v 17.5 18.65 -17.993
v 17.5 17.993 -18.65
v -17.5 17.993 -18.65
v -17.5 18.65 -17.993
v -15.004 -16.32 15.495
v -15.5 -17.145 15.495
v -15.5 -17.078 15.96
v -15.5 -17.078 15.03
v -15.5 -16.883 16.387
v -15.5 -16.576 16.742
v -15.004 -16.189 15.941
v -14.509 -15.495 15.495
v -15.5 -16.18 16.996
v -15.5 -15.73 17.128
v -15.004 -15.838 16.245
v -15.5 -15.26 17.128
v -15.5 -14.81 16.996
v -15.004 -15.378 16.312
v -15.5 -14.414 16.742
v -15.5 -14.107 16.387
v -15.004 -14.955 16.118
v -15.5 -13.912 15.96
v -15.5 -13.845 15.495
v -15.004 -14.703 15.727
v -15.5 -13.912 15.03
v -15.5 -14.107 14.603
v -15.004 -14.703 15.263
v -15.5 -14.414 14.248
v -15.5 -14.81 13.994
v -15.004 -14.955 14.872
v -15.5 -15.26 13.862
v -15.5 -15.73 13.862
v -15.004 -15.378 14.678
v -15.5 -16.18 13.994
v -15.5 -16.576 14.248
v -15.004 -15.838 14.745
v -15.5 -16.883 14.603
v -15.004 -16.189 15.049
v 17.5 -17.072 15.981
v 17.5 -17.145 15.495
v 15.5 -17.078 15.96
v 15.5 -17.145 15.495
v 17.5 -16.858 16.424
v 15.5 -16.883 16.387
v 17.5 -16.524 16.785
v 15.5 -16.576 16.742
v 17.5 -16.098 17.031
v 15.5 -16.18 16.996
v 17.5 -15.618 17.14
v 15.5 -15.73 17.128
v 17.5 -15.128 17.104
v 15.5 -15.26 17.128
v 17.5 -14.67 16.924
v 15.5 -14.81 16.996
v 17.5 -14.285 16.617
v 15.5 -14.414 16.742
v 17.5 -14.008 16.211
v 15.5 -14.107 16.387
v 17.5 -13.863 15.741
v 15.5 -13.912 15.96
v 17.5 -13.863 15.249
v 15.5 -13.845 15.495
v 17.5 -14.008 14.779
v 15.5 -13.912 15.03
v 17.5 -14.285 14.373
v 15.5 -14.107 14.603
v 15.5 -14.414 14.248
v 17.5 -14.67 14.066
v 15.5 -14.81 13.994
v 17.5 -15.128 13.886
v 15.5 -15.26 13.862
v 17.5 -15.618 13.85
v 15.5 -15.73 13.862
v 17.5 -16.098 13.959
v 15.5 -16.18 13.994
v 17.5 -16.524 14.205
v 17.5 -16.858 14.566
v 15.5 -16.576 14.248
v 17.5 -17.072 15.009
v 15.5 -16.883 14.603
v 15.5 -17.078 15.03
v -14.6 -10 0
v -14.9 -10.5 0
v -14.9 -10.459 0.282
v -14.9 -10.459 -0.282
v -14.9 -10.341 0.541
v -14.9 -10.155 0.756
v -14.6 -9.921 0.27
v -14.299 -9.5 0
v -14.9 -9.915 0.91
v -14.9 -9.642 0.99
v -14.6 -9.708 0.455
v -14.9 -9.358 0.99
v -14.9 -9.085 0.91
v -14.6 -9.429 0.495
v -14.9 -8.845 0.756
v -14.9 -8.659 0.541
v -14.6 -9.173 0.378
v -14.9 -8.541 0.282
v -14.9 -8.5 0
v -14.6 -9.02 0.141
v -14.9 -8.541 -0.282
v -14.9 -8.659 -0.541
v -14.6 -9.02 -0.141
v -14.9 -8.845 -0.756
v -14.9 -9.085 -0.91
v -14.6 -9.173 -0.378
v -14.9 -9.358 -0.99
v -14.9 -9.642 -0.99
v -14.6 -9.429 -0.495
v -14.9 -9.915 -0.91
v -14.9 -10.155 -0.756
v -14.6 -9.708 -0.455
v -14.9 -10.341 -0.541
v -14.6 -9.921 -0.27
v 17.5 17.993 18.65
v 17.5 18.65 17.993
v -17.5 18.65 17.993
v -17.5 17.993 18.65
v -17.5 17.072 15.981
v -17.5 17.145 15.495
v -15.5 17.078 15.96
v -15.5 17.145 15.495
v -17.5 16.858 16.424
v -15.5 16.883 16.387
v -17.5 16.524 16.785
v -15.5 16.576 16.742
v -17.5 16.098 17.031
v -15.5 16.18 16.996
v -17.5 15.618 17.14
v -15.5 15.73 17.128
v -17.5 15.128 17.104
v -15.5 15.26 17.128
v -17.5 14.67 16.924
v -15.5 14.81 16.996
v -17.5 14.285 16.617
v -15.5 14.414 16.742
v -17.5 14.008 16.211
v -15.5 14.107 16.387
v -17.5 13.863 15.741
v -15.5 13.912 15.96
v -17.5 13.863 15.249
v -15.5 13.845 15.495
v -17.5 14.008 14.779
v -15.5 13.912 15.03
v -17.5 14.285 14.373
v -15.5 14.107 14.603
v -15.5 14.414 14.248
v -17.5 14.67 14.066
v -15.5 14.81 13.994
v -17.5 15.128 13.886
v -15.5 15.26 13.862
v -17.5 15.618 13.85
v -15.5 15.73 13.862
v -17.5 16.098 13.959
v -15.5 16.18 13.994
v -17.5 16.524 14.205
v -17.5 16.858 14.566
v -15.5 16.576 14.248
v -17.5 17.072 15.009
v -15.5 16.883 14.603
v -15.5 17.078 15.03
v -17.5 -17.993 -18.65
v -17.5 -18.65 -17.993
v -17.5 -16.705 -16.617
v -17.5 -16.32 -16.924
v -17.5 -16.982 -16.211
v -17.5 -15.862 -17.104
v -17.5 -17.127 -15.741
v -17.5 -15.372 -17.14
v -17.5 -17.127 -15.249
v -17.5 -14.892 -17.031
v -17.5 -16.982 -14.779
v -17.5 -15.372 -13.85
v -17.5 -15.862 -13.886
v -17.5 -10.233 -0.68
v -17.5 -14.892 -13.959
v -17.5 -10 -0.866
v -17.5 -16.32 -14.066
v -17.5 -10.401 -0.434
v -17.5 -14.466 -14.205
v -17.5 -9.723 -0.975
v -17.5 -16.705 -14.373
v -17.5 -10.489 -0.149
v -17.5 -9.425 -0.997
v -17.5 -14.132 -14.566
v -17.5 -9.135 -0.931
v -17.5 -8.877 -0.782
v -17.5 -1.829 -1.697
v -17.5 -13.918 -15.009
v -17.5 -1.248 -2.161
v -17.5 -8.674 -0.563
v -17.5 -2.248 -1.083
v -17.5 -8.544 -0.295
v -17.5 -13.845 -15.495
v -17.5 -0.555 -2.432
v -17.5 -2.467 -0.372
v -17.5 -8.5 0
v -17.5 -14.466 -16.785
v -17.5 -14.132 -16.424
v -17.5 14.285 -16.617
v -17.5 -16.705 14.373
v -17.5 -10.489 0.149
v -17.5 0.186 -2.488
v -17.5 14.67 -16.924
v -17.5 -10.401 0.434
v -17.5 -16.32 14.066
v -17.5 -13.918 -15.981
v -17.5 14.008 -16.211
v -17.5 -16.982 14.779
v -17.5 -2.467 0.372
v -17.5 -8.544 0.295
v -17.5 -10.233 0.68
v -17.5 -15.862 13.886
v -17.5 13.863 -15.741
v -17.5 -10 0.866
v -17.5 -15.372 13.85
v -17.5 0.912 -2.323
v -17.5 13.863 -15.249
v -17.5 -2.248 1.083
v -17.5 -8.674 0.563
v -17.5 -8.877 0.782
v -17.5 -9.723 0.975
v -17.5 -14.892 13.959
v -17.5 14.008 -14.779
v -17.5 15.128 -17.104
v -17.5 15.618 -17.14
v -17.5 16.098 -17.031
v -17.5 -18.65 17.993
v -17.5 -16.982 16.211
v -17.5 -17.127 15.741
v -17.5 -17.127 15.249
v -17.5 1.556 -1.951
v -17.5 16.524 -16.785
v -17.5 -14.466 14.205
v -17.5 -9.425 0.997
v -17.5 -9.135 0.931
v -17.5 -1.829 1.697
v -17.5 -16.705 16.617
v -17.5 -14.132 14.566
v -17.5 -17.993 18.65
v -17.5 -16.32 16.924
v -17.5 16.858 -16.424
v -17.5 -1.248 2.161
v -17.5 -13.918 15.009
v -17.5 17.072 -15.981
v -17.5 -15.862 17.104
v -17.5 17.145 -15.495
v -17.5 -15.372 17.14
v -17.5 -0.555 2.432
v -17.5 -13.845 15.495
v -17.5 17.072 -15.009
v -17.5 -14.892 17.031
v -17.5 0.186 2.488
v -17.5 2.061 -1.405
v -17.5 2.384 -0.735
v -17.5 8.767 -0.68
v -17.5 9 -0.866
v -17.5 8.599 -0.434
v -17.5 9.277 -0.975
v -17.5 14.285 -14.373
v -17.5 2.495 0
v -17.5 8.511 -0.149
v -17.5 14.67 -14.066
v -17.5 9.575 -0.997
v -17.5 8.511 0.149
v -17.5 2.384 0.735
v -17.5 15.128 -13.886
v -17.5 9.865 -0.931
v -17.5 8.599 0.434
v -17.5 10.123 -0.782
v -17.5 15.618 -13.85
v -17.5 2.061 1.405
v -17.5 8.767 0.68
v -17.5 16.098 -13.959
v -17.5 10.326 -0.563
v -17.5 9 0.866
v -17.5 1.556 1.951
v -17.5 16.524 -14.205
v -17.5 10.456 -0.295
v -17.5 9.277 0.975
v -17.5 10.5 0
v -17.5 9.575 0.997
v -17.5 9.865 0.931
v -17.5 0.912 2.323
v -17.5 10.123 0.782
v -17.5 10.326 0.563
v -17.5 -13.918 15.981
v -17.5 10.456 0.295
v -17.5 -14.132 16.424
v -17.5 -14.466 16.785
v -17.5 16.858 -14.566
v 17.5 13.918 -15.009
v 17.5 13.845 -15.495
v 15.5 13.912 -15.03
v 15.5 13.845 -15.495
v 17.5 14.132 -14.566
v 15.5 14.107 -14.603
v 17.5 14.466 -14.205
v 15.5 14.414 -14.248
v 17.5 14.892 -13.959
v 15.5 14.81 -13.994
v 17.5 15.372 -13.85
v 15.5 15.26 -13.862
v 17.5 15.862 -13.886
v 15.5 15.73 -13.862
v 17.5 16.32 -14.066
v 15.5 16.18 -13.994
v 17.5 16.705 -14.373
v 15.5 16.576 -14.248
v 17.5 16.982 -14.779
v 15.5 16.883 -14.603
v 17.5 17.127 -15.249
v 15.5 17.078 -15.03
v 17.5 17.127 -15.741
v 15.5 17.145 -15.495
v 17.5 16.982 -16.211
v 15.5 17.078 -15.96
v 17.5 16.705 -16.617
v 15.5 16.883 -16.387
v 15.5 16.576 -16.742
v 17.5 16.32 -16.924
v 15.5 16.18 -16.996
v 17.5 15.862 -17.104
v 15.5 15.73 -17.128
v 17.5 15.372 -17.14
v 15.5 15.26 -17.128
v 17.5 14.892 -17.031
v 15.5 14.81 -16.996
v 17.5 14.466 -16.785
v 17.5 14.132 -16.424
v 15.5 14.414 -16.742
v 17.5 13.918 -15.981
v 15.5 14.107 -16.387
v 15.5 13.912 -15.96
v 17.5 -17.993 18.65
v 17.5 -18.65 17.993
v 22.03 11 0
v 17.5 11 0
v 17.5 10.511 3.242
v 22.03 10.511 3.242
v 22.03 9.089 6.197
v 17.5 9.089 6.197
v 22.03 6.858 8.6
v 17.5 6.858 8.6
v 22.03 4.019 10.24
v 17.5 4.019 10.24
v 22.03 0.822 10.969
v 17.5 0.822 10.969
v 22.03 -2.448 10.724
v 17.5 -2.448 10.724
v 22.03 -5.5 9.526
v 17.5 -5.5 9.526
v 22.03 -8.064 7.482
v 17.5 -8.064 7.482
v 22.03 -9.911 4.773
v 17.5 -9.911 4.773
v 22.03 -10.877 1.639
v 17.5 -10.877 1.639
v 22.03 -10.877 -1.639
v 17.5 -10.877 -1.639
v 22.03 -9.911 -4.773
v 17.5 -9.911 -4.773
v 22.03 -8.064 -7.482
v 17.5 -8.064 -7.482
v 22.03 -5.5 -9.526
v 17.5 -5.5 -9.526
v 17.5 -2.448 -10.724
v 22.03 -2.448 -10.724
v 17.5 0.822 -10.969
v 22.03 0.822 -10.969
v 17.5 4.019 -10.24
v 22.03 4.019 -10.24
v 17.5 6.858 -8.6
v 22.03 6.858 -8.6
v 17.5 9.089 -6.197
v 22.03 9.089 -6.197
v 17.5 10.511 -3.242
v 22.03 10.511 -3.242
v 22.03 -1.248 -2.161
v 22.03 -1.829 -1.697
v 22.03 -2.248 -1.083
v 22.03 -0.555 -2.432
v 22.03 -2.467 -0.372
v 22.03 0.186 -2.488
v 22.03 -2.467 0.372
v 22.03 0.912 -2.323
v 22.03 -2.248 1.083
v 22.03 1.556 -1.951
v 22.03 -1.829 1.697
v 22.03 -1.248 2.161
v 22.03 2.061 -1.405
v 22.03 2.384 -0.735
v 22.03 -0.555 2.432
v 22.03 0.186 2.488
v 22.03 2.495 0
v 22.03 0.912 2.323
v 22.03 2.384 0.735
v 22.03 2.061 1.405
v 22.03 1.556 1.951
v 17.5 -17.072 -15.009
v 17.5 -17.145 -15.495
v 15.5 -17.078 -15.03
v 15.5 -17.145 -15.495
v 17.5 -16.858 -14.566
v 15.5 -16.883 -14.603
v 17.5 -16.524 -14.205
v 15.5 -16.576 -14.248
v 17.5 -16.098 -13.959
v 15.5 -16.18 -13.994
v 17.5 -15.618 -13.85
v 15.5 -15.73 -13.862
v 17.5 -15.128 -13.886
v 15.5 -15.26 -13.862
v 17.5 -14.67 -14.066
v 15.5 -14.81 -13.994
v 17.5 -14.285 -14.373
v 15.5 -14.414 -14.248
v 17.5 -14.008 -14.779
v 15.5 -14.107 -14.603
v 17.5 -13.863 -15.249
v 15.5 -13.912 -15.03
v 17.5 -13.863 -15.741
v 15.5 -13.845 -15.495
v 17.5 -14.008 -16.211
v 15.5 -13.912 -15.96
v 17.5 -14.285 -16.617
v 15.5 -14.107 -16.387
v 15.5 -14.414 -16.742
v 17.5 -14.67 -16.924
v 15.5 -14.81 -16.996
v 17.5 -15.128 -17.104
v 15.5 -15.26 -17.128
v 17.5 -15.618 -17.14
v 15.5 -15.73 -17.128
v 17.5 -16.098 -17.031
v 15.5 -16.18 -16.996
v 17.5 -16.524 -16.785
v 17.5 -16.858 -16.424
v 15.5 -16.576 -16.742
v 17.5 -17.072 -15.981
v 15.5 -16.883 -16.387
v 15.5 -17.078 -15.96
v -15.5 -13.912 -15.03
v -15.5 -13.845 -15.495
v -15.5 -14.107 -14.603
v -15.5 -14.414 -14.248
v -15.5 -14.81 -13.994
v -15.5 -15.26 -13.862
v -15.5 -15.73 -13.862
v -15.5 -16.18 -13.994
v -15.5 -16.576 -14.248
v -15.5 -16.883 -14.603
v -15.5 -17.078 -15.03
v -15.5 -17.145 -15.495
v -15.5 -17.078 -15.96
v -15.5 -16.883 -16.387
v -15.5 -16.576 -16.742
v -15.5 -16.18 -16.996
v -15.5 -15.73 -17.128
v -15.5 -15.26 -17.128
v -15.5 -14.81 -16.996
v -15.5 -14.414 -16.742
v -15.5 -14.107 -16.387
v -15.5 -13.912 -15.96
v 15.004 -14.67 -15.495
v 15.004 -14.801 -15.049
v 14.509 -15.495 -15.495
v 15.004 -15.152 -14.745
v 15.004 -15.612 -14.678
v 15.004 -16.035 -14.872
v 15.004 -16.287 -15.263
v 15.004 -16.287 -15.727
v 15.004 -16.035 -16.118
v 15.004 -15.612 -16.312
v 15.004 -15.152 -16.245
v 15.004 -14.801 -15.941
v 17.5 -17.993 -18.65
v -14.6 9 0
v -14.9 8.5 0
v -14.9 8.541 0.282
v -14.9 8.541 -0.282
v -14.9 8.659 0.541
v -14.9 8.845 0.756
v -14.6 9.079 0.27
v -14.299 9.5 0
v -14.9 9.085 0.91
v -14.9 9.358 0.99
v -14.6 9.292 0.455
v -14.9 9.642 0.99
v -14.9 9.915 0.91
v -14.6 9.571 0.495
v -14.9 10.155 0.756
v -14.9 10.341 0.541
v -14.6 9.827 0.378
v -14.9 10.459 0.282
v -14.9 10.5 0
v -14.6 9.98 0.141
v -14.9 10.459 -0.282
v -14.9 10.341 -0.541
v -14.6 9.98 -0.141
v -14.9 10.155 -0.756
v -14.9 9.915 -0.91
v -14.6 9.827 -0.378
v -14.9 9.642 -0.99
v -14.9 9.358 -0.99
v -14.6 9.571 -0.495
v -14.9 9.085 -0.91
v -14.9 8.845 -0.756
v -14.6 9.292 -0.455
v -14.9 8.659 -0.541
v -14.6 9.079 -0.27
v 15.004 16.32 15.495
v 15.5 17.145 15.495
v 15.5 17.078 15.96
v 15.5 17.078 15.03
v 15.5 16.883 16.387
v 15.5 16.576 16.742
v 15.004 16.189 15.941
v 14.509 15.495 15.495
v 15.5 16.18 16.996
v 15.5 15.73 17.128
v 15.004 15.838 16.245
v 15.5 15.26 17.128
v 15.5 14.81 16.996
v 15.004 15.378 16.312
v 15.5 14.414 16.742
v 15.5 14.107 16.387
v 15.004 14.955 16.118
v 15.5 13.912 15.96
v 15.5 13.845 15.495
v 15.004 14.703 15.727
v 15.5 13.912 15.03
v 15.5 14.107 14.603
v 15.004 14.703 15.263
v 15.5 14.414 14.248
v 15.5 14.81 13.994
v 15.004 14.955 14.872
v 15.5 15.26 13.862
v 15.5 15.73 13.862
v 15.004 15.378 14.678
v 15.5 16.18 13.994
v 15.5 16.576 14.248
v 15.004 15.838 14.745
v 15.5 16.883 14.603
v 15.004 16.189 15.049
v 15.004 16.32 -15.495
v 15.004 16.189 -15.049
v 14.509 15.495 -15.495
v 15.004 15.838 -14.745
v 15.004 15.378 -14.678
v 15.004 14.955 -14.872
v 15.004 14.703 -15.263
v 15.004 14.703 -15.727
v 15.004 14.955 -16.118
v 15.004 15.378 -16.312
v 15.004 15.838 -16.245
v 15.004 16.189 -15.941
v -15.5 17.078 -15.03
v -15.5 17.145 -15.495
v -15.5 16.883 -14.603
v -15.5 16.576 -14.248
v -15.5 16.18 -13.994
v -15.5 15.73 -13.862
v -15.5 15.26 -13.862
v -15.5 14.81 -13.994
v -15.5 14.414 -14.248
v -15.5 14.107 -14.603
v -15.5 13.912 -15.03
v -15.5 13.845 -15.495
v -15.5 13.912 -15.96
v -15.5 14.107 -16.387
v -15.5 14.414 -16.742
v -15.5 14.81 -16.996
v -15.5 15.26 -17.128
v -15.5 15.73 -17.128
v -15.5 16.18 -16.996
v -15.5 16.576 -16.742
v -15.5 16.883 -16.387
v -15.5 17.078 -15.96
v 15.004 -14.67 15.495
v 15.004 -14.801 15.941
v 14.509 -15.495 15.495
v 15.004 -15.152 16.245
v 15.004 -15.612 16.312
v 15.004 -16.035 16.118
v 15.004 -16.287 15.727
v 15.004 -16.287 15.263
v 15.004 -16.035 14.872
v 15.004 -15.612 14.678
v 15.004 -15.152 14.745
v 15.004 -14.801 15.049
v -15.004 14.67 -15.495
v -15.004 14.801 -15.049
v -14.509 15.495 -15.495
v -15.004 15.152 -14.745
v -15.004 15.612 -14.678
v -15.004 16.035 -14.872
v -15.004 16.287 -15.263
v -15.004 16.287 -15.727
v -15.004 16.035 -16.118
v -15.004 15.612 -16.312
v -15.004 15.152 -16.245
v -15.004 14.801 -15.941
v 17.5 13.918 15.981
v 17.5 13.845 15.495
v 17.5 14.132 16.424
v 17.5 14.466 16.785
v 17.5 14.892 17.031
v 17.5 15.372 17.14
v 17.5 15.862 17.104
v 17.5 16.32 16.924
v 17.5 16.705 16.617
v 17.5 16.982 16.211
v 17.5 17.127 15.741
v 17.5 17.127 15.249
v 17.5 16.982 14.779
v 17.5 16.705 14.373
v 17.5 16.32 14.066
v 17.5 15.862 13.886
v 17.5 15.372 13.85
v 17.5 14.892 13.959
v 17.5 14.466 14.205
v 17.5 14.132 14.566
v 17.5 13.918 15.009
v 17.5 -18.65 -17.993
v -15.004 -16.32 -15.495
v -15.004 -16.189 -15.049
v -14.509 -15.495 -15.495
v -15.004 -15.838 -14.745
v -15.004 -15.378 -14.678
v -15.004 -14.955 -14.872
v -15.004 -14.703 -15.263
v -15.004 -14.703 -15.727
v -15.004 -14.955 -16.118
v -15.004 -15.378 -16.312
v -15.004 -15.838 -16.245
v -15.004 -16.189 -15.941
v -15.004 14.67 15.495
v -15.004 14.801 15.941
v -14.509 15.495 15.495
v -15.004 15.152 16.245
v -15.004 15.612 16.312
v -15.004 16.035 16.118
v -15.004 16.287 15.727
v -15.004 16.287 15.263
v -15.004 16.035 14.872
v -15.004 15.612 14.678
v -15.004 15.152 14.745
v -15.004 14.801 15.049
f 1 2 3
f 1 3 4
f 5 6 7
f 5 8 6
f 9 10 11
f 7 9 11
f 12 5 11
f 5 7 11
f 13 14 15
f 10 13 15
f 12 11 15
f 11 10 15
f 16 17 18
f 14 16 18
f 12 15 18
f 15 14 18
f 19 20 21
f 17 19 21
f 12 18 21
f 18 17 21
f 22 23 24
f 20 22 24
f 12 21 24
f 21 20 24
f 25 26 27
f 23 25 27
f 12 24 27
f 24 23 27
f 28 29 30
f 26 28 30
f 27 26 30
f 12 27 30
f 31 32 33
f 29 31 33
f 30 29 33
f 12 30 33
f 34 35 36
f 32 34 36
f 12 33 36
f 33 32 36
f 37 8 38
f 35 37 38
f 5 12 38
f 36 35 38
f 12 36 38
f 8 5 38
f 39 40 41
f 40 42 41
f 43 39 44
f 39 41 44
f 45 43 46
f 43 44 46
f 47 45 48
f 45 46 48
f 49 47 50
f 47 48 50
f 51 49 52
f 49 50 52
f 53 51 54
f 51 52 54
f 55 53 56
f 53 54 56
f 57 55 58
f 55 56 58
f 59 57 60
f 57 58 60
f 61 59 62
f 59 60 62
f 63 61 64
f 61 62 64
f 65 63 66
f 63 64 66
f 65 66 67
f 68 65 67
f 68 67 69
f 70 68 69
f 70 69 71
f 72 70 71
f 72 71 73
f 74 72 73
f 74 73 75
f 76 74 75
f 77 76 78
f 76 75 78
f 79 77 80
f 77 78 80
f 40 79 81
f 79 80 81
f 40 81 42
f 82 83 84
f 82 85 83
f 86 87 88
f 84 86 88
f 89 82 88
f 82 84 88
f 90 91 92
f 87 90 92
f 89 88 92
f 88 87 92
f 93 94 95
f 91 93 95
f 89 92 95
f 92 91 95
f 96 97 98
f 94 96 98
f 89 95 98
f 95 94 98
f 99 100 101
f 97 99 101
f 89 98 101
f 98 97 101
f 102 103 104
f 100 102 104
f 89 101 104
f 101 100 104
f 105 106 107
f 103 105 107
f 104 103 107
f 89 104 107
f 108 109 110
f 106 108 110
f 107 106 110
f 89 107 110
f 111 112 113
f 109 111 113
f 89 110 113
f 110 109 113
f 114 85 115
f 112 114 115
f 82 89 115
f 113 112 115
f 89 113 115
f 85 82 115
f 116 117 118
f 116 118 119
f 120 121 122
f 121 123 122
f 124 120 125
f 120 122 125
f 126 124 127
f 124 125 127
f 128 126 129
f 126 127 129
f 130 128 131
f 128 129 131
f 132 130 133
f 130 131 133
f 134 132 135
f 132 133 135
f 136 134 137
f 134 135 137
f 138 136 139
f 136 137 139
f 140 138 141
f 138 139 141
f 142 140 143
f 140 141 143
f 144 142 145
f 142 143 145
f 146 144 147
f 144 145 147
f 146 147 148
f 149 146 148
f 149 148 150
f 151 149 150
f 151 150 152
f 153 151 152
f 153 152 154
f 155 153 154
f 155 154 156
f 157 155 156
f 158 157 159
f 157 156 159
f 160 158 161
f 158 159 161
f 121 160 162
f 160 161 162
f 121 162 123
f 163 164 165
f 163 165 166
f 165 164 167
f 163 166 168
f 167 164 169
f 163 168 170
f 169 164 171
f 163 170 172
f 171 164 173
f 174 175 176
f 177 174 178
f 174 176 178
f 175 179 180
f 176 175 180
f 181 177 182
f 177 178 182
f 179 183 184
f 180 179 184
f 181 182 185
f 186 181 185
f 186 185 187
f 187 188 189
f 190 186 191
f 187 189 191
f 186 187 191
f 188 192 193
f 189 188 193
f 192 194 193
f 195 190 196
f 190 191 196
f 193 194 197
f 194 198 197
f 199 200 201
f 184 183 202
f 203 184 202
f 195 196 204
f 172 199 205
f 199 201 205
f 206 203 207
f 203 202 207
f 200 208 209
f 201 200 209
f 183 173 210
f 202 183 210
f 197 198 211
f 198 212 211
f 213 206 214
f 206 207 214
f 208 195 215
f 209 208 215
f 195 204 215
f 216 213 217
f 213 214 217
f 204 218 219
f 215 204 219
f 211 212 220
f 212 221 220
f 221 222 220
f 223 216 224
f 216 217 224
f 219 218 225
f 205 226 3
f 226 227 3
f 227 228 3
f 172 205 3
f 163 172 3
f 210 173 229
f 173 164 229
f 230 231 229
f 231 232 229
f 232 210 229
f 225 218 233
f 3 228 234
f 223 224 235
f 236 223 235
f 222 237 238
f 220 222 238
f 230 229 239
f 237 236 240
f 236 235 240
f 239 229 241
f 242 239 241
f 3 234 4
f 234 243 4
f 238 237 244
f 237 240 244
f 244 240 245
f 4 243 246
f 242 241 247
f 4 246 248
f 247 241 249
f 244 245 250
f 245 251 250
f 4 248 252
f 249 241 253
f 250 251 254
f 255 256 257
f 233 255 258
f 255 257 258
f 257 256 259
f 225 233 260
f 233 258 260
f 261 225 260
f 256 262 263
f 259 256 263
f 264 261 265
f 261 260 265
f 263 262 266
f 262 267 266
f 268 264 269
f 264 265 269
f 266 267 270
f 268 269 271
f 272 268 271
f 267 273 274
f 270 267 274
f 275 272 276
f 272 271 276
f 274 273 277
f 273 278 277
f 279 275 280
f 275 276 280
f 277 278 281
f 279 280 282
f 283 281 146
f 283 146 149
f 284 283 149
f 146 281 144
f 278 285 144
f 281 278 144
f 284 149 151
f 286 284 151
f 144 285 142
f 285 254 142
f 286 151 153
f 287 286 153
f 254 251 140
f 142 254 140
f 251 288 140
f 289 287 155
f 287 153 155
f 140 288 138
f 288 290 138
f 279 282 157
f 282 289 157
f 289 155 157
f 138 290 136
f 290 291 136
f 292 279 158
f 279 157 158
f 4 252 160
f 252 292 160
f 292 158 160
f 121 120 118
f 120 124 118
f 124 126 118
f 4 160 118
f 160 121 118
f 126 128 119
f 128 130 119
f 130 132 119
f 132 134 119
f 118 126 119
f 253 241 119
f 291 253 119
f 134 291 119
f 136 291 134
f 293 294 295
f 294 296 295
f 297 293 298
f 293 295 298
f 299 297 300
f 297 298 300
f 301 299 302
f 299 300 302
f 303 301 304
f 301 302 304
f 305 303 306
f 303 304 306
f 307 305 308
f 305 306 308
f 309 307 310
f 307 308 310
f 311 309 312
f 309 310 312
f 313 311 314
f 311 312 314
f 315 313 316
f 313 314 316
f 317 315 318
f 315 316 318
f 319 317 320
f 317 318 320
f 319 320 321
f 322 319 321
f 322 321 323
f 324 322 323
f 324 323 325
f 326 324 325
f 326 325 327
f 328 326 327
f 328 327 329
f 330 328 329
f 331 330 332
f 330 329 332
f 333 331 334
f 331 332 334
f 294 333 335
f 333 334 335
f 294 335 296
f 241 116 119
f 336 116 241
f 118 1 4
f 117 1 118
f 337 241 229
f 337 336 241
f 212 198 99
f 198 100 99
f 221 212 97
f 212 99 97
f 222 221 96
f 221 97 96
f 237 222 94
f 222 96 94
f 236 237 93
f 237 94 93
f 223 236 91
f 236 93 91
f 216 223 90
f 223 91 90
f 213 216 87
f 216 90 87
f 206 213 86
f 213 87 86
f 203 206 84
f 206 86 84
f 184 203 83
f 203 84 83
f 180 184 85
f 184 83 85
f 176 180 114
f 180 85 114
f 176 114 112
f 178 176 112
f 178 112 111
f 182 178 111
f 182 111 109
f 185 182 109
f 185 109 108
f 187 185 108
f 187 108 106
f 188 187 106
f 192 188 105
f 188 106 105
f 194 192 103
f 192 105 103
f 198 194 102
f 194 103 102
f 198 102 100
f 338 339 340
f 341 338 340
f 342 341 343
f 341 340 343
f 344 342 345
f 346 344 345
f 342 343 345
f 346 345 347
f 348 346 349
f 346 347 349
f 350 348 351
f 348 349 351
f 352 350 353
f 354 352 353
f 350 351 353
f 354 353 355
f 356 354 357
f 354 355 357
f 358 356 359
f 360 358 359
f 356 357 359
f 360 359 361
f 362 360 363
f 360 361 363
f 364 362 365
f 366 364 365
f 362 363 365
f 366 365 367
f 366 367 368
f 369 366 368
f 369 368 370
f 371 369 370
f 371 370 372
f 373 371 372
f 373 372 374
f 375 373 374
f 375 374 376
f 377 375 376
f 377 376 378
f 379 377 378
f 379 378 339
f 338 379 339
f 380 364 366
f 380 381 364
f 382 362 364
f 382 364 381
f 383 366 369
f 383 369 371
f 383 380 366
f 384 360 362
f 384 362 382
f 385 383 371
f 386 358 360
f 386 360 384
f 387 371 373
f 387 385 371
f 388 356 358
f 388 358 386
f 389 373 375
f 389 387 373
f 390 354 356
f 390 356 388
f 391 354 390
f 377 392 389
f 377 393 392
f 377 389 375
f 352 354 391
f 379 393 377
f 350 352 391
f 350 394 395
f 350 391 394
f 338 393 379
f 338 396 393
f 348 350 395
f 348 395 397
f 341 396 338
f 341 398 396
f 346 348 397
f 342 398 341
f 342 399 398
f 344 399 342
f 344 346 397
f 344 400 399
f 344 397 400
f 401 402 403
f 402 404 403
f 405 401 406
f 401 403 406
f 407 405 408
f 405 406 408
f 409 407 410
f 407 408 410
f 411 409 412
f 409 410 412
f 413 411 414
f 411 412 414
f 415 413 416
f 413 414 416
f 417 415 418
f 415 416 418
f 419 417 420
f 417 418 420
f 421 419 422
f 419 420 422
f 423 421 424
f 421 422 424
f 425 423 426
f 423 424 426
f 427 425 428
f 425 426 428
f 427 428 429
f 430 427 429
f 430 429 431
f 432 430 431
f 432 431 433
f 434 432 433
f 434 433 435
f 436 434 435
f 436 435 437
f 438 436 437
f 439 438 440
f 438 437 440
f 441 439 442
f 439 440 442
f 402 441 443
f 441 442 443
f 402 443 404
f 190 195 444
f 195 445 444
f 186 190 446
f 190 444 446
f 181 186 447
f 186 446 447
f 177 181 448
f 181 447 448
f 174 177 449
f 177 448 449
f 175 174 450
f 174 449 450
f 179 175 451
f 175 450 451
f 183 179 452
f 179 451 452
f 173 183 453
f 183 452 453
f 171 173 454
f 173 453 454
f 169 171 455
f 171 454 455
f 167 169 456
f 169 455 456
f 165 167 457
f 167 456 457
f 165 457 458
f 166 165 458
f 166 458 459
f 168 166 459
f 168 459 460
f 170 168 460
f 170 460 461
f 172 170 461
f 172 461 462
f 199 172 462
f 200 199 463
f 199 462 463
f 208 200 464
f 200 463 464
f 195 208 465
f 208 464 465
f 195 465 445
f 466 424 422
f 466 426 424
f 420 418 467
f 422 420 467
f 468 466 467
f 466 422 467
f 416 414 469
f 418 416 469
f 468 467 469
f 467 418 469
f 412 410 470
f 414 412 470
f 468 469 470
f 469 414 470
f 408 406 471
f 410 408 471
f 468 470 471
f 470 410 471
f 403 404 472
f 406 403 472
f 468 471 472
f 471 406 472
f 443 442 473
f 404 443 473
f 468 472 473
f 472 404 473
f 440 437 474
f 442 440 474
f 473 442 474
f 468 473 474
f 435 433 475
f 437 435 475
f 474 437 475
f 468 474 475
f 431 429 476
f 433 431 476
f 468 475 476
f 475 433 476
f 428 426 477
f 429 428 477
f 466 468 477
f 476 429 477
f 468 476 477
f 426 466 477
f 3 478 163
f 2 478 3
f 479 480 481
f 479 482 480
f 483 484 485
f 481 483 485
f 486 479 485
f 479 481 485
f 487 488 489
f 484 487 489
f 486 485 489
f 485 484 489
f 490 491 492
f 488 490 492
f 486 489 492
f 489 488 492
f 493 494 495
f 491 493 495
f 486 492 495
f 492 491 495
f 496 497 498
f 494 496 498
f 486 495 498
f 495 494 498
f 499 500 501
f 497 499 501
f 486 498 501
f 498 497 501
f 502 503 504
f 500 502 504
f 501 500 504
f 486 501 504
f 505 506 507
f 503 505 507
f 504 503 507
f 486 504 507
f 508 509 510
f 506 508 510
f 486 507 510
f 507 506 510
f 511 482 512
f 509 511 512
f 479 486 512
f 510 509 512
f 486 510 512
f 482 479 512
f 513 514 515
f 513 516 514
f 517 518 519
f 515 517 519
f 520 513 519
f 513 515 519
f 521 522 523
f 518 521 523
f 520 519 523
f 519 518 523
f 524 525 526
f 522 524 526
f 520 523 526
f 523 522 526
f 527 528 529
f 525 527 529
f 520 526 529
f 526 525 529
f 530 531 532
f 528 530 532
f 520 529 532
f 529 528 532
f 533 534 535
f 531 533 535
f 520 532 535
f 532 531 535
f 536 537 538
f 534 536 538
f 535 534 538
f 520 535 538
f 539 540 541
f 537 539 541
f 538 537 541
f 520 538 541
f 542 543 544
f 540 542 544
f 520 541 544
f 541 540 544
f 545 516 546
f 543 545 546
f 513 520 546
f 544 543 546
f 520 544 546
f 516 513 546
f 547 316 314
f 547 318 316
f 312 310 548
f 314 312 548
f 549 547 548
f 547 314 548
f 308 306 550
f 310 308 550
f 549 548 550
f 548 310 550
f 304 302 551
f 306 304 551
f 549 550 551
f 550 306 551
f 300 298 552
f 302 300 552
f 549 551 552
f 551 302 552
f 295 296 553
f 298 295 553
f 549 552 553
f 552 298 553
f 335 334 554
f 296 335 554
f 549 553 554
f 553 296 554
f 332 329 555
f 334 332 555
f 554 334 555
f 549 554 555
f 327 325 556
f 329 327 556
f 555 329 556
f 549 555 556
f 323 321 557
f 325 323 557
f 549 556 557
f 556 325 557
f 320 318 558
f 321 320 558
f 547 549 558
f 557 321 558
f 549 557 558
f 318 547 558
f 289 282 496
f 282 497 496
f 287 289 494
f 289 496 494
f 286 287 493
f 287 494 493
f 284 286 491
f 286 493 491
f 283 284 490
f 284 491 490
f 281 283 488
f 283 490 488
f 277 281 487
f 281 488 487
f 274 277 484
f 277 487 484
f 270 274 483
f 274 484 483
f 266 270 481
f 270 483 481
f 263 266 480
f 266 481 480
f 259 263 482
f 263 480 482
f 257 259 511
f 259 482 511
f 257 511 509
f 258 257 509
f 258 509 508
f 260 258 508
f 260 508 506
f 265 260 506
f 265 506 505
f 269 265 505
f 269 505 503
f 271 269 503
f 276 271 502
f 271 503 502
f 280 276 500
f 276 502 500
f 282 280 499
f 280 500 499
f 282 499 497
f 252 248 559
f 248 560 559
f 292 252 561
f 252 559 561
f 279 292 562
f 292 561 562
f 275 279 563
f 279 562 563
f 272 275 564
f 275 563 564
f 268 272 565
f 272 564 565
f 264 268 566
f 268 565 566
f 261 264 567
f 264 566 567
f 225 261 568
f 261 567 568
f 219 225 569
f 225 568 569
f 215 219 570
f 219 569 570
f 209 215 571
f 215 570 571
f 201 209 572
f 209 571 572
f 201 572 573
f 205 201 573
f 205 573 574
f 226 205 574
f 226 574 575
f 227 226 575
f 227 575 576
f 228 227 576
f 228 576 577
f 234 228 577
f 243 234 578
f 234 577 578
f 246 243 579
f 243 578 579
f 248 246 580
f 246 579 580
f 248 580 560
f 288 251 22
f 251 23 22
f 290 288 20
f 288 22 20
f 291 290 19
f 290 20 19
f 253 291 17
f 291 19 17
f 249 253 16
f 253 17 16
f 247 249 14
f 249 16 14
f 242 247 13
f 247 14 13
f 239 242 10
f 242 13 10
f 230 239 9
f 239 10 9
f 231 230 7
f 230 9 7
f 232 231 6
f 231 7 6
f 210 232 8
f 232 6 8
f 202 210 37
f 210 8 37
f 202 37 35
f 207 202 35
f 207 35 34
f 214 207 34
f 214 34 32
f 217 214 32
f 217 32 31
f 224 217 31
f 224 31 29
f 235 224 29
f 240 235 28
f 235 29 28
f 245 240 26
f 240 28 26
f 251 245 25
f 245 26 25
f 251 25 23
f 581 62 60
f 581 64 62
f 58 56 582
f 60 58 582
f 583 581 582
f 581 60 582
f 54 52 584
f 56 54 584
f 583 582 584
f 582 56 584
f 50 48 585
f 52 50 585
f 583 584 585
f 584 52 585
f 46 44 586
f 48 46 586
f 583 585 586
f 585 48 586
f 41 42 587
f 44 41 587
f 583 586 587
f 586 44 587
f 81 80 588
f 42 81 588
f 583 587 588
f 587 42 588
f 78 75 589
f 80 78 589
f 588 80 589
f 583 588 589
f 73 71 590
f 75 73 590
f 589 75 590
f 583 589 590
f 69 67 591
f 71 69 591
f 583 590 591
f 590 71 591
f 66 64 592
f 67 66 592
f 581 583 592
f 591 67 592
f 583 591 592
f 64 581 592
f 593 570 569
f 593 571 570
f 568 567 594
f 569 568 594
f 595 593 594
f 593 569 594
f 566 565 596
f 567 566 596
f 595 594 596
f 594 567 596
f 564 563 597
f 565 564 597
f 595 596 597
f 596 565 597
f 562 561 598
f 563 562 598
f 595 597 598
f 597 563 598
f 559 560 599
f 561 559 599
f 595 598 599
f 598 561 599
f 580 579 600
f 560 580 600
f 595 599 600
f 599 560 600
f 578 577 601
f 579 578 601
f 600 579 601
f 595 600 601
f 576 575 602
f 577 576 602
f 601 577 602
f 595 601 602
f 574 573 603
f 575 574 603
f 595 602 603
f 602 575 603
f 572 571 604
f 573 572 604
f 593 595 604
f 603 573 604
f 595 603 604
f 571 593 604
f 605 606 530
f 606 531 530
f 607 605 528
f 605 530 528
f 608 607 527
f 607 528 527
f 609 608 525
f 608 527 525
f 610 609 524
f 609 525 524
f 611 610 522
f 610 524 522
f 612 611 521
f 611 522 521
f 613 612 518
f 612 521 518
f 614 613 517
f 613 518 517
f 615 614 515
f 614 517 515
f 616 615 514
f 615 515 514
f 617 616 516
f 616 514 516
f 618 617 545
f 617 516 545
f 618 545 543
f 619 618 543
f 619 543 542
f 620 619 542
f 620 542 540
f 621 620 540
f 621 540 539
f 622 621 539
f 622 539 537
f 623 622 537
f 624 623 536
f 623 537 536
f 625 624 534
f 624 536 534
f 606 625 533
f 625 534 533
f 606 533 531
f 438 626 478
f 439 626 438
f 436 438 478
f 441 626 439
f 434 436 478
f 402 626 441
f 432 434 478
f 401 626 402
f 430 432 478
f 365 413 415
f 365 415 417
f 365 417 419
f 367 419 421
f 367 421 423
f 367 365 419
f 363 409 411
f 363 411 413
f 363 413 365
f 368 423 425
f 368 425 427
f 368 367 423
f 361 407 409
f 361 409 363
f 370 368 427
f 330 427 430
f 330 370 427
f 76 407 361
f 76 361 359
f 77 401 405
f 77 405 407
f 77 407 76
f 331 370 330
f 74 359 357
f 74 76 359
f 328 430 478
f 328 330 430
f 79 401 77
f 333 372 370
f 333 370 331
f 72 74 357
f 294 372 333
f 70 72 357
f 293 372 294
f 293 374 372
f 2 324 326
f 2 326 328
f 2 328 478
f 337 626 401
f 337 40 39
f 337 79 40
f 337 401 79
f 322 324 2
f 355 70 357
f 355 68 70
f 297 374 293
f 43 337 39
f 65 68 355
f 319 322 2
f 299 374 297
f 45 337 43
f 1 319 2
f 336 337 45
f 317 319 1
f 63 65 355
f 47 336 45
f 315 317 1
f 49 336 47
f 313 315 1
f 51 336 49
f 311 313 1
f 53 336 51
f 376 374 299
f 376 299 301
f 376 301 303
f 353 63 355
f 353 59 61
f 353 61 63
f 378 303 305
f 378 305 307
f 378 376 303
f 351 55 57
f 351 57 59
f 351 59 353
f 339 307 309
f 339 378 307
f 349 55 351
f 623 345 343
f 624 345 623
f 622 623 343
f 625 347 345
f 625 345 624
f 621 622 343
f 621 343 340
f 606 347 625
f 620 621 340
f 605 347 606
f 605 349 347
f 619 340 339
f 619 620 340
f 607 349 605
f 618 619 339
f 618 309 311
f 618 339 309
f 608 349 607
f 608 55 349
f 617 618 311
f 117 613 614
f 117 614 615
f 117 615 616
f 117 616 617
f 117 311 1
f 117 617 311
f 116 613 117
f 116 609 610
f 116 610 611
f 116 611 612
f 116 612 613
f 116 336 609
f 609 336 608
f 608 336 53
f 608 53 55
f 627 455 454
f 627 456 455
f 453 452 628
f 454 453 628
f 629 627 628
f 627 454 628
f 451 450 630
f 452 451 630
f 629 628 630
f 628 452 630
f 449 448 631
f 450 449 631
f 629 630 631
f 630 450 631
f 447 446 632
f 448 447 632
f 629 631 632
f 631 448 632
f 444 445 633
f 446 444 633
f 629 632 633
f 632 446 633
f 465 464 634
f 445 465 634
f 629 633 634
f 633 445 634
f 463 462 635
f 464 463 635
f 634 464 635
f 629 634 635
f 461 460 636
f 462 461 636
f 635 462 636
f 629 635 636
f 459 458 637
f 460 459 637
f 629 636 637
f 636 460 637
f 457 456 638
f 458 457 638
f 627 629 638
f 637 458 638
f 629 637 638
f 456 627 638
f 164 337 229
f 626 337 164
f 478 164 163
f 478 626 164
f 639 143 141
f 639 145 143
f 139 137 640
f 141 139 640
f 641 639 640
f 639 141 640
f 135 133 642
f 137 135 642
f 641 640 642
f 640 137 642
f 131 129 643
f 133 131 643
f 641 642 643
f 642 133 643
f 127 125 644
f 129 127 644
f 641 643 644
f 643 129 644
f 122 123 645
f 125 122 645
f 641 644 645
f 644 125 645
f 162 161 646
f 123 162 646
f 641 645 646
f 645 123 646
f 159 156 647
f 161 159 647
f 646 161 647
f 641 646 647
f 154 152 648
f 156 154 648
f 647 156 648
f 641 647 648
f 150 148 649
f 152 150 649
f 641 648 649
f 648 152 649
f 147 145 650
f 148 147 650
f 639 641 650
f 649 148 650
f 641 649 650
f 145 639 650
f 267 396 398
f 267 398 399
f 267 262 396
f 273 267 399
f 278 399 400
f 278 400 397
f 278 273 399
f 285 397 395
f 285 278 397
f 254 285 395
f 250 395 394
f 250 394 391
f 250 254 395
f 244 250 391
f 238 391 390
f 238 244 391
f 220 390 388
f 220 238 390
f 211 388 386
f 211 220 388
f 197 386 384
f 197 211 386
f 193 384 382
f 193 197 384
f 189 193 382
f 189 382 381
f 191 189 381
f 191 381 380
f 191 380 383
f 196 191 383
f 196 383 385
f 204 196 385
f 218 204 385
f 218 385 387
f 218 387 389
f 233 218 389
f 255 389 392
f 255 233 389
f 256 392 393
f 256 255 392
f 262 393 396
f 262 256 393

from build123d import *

# Parameters (mm, degrees)
F0_R     = 11
F1_DEPTH = 17.5
F0_R_2   = 2.495
F2_DEPTH = 17.5
F3_DEPTH = 22.03
F6_D     = 3.3
F6_DEPTH = 2
F6_TIP   = 0.9914200214
F7_D     = 3.3
F7_DEPTH = 2
F7_TIP   = 0.9914200214
F8_D     = 2
F8_DEPTH = 2.6
F8_TIP   = 0.600860619


with BuildPart() as f1:
    # F0 (on Right) → F1 (new body, symmetric)
    with BuildSketch(Plane.YZ):
        Polygon((-17.9930978003, -18.65), (17.9930978003, -18.65), (18.65, -17.9930978003), (18.65, 17.9930978003), (17.9930978003, 18.65), (-17.9930978003, 18.65), (-18.65, 17.9930978003), (-18.65, -17.9930978003), align=None)
        Circle(F0_R, mode=Mode.SUBTRACT)
    extrude(amount=F1_DEPTH, both=True)

    # F0 (on Right) → F2 (join, through all)
    with BuildSketch(Plane.YZ):
        Circle(F0_R)
        Circle(F0_R_2, mode=Mode.SUBTRACT)
    extrude(amount=-F2_DEPTH)

    # F0 (on Right) → F3 (join)
    with BuildSketch(Plane.YZ):
        Circle(F0_R)
        Circle(F0_R_2, mode=Mode.SUBTRACT)
    extrude(amount=F3_DEPTH)

    # F6
    with Locations(Plane.YZ.offset(17.5)):
        with Locations((15.495, 15.495), (-15.495, 15.495), (15.495, -15.495), (-15.495, -15.495)):
            Hole(F6_D / 2, depth=F6_DEPTH)
            with Locations((0, 0, -(F6_DEPTH + F6_TIP / 2))):  # 118° drill point
                Cone(0, F6_D / 2, F6_TIP, mode=Mode.SUBTRACT)

    # F7
    with Locations(Plane(origin=(-17.5, 0, 0), x_dir=(0, -1, 0), z_dir=(-1, 0, 0))):
        with Locations((-15.495, 15.495), (-15.495, -15.495), (15.495, -15.495), (15.495, 15.495)):
            Hole(F7_D / 2, depth=F7_DEPTH)
            with Locations((0, 0, -(F7_DEPTH + F7_TIP / 2))):  # 118° drill point
                Cone(0, F7_D / 2, F7_TIP, mode=Mode.SUBTRACT)

    # F8
    with Locations(Plane(origin=(-17.5, 0, 0), x_dir=(0, -1, 0), z_dir=(-1, 0, 0))):
        with Locations((-9.5, 0), (9.5, 0)):
            Hole(F8_D / 2, depth=F8_DEPTH)
            with Locations((0, 0, -(F8_DEPTH + F8_TIP / 2))):  # 118° drill point
                Cone(0, F8_D / 2, F8_TIP, mode=Mode.SUBTRACT)


solid = f1.part
